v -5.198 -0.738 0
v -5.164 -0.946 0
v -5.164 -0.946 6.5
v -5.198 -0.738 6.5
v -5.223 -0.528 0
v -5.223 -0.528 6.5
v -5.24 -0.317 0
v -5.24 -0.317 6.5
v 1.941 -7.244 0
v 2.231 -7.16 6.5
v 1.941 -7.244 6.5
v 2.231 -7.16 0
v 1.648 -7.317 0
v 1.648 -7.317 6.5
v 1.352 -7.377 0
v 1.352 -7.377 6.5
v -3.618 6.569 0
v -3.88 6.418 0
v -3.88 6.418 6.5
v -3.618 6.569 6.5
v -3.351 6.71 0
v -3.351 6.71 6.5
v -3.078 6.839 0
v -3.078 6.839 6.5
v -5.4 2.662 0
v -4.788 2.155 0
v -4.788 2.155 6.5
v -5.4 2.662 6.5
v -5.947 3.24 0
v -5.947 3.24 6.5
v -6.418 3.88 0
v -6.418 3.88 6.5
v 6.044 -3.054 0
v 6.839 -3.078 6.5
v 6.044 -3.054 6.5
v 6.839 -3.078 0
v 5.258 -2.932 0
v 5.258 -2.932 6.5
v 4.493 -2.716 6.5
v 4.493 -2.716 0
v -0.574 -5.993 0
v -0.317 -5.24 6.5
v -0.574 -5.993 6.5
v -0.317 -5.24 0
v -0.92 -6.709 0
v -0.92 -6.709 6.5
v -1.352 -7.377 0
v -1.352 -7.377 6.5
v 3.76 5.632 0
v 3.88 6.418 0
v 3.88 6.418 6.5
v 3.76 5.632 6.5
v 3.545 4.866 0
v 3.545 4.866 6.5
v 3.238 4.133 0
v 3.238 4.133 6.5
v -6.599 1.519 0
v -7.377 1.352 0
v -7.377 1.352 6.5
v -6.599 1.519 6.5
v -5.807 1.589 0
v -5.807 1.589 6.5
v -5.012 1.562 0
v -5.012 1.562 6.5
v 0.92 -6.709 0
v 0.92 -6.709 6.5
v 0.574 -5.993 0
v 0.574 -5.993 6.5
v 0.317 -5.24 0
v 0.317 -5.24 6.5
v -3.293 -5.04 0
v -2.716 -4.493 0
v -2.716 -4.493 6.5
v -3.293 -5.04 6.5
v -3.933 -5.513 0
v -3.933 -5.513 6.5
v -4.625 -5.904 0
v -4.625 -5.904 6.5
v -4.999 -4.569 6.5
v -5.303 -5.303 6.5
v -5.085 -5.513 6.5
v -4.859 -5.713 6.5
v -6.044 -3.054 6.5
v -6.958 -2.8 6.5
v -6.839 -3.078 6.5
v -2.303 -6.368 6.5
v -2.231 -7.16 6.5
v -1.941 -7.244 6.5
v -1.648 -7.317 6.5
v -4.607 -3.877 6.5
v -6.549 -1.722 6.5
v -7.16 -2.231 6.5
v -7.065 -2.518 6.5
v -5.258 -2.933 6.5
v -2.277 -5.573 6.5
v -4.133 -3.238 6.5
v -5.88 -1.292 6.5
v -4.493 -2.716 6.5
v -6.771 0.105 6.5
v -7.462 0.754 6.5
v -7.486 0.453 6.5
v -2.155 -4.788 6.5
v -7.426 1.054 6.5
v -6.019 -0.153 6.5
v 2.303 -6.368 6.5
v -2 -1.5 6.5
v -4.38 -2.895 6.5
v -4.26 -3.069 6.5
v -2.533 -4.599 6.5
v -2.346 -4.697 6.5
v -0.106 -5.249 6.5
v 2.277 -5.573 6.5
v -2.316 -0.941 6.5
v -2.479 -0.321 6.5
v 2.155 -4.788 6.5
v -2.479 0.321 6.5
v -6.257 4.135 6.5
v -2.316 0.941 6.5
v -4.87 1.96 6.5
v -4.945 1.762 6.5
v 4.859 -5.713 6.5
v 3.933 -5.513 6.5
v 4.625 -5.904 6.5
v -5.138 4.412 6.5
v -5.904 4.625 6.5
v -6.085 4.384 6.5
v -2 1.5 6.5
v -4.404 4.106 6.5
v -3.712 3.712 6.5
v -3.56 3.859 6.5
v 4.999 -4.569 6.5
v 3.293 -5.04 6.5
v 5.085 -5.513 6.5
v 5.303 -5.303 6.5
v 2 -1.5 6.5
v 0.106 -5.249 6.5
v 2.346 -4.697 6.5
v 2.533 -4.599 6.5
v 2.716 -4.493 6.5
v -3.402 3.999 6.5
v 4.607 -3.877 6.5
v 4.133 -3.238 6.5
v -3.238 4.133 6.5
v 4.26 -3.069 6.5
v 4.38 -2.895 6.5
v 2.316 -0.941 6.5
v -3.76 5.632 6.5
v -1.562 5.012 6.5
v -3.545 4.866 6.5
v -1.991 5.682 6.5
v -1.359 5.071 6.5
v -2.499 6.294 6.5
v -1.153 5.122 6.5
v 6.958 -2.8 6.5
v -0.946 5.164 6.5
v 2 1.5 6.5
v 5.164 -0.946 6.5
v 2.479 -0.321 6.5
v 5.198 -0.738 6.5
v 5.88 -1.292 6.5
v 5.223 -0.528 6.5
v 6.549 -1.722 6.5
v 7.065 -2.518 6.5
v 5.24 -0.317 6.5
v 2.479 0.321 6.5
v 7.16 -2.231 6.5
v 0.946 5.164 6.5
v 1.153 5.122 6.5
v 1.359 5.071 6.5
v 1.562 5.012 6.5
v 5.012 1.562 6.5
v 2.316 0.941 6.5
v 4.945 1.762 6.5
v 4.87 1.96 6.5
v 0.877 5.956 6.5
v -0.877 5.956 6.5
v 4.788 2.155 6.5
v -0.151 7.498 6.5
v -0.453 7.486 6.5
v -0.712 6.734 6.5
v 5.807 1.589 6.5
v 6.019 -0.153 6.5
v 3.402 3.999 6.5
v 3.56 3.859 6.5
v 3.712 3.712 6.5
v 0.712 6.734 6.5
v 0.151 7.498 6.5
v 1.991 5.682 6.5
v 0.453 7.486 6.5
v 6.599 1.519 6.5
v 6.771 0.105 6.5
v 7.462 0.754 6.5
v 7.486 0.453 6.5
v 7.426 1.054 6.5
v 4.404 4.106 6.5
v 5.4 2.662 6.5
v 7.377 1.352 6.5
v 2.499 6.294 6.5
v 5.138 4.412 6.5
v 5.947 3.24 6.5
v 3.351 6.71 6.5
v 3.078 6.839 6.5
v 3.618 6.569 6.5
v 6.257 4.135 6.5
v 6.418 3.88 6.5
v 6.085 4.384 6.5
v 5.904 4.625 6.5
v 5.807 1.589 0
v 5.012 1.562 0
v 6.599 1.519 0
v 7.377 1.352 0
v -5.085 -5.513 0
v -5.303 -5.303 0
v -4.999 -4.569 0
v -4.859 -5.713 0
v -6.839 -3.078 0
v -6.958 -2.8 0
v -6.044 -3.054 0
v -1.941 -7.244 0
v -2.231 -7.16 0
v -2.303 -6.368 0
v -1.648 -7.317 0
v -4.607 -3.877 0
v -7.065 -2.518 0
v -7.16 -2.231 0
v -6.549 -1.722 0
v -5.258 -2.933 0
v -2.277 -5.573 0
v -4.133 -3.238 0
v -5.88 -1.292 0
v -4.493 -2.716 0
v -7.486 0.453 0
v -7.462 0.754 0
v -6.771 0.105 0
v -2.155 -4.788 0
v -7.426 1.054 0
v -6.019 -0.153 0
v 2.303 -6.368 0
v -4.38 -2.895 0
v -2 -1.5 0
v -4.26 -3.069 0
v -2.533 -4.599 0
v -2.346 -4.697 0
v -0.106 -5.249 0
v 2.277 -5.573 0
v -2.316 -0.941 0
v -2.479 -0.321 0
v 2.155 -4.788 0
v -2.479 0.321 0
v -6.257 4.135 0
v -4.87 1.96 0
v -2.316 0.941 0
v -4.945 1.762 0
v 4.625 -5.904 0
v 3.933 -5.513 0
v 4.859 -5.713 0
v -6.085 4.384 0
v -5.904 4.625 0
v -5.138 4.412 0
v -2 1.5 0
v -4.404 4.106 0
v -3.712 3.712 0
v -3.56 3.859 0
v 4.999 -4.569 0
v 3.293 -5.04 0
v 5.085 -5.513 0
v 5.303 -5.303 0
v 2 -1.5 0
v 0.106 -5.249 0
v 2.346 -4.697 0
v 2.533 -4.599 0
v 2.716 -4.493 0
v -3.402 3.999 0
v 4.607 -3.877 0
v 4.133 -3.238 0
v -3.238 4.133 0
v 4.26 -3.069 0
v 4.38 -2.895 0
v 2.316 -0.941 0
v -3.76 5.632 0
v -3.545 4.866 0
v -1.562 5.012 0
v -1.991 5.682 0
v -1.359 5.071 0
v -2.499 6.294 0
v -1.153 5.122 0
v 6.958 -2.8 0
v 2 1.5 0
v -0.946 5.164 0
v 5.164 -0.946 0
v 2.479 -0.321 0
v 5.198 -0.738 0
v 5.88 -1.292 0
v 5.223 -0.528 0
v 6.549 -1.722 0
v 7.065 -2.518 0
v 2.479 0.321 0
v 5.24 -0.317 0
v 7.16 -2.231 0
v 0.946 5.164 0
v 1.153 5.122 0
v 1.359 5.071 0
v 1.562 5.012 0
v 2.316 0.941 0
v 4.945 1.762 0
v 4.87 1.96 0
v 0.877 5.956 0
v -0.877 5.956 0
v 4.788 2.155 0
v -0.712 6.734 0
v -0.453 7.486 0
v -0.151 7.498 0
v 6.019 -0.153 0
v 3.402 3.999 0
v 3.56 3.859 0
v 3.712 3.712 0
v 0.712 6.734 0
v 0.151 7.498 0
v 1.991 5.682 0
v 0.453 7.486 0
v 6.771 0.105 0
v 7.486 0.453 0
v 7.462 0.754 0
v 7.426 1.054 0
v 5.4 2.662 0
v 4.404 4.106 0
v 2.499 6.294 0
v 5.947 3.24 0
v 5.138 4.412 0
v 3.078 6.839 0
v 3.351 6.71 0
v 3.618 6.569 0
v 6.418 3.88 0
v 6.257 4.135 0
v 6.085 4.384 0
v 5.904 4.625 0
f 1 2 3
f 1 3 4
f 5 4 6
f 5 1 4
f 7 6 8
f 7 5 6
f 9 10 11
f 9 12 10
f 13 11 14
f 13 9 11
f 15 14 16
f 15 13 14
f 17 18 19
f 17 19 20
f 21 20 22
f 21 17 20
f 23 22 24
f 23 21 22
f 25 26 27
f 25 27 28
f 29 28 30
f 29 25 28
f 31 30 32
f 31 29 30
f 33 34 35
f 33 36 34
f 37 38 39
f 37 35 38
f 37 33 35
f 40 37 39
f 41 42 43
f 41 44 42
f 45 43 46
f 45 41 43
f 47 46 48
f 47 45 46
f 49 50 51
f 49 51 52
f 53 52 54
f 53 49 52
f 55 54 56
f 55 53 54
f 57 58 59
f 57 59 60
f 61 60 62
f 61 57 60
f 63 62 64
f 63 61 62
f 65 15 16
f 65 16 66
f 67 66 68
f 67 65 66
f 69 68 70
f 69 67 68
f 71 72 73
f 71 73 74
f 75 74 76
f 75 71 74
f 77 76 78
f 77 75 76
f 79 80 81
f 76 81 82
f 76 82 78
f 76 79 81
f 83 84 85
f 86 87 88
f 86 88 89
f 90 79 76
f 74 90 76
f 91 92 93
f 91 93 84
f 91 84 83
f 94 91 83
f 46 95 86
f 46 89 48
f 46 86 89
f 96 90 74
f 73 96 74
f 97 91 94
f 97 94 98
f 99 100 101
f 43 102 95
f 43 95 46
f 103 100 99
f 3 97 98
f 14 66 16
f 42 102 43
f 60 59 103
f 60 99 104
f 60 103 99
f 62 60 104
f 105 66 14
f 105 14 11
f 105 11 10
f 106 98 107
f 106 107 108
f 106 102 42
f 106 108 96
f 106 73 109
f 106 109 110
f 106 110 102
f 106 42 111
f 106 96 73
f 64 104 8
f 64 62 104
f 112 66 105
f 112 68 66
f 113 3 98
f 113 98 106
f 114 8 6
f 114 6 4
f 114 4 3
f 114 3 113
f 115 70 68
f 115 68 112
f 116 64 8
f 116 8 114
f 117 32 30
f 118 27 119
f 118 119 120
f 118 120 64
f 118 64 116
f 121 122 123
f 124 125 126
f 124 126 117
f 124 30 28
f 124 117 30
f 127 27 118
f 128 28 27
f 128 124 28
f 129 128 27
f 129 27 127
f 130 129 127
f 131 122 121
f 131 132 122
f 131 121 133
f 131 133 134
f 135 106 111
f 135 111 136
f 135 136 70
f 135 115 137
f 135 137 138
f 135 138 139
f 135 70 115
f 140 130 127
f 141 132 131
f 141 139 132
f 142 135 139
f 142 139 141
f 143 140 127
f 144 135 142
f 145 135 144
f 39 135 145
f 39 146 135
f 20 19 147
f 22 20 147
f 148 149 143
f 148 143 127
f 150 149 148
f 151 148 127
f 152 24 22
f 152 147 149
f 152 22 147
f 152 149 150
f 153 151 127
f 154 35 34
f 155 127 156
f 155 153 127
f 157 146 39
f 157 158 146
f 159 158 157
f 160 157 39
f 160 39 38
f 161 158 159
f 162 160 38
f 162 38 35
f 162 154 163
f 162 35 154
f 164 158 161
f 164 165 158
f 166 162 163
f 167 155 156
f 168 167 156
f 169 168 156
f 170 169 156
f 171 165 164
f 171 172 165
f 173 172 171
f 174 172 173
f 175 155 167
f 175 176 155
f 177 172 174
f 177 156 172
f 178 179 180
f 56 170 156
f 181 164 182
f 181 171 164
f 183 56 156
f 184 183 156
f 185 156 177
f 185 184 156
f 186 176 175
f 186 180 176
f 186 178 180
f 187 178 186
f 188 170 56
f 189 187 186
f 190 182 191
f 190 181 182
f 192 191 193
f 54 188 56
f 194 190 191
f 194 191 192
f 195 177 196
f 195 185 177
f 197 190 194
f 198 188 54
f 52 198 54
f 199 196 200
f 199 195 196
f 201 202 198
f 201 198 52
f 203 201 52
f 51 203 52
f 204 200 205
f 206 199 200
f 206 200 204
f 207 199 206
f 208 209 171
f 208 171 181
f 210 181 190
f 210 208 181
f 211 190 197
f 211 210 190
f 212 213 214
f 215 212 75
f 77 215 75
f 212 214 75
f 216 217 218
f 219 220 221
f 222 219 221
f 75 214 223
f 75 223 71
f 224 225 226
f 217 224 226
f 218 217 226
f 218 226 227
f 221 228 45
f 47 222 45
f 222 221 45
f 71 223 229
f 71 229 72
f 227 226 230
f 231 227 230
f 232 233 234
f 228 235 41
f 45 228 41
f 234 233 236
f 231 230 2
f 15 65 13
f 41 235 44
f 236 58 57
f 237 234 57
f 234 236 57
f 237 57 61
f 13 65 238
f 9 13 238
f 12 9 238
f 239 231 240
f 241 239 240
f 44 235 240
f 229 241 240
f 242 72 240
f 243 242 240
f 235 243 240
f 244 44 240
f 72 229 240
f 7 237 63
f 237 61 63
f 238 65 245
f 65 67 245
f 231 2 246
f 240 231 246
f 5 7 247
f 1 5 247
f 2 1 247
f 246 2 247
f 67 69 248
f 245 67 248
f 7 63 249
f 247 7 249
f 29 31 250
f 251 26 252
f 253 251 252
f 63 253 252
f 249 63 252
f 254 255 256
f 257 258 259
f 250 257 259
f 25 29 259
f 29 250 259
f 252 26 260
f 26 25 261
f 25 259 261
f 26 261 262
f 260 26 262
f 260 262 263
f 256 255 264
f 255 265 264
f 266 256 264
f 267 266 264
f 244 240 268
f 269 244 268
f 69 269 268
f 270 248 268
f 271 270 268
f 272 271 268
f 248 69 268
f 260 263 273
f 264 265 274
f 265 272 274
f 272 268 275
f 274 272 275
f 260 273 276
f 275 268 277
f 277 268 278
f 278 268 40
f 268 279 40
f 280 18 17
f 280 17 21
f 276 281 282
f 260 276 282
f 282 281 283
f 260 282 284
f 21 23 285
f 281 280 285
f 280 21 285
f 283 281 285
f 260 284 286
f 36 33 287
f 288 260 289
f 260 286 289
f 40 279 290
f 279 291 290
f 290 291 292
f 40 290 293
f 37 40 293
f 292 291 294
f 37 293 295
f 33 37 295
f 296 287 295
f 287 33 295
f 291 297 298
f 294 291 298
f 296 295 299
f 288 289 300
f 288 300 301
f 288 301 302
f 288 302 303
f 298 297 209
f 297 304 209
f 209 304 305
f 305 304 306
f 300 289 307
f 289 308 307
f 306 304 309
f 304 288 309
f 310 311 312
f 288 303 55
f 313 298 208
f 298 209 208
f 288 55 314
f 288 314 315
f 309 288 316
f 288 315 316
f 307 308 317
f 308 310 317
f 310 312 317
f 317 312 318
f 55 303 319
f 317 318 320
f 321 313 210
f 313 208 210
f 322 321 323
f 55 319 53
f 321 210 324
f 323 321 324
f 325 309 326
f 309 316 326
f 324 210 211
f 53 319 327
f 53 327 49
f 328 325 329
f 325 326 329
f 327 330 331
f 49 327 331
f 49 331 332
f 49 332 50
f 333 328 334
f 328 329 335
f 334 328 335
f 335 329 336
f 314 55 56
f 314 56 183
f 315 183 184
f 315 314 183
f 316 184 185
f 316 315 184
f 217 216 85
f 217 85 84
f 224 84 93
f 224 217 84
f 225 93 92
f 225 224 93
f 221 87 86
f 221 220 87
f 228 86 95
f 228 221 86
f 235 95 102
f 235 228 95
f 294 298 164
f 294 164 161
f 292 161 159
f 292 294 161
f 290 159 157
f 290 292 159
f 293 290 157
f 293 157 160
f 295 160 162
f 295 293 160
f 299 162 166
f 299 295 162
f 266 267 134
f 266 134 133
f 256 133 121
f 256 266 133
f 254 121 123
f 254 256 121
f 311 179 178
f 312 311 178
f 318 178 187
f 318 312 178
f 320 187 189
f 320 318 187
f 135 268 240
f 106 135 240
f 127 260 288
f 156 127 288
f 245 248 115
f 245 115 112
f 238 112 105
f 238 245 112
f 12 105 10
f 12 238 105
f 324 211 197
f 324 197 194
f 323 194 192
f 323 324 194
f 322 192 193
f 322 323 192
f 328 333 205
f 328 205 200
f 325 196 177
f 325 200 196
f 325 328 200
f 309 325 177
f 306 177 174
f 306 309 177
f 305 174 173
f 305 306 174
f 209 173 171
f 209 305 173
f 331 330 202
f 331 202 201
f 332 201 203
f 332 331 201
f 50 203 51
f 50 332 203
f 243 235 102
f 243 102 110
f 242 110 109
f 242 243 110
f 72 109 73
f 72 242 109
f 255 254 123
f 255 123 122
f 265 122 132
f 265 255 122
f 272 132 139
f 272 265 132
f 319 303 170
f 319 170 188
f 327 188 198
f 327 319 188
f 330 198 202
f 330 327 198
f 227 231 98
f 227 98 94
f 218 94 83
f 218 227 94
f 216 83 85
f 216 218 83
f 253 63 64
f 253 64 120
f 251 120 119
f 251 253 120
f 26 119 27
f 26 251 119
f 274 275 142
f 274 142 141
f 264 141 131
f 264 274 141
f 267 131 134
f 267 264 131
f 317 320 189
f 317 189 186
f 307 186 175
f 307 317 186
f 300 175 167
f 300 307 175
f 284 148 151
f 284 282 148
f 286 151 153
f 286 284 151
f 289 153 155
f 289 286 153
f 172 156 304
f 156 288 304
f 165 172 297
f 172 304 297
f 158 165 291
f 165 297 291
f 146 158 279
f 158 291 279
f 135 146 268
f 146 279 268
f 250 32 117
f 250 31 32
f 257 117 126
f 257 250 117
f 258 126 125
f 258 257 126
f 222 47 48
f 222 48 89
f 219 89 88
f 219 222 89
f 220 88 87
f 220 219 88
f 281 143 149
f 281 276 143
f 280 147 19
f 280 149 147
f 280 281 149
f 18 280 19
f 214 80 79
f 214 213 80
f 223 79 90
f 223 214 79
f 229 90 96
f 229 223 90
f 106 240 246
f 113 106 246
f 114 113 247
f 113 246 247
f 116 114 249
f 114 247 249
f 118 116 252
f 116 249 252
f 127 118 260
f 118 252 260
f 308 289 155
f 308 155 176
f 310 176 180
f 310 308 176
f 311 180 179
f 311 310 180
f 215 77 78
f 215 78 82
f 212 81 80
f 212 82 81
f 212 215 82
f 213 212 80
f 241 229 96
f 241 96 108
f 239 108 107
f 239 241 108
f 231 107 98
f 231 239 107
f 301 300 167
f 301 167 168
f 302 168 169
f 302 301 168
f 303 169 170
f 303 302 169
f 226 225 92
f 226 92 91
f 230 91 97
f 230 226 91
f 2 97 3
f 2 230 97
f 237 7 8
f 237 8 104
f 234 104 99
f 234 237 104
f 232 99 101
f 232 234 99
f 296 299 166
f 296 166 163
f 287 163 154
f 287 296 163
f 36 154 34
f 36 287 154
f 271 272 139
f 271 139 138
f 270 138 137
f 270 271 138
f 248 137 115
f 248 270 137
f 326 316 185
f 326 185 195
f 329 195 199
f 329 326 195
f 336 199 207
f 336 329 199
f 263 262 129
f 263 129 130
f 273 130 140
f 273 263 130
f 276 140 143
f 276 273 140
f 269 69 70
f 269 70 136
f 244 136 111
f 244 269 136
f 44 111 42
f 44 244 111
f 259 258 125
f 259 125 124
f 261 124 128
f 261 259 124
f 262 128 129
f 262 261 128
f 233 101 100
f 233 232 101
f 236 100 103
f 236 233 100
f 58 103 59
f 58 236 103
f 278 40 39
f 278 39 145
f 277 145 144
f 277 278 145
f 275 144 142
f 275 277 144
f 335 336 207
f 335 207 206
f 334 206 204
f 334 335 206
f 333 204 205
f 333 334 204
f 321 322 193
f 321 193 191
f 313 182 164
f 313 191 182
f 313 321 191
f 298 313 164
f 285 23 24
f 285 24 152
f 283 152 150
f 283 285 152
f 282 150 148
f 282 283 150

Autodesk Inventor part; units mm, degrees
ref_plane "YZ Plane" through (0, 0, 0) normal (1, 0, 0) x (0, 1, 0)
ref_plane "XZ Plane" through (0, 0, 0) normal (0, 1, 0) x (-1, 0, 0)
ref_plane "XY Plane" through (0, 0, 0) normal (0, 0, 1) x (1, 0, 0)
sketch "スケッチ1" plane through (0, 0, 0) normal (0, 0, 1) x (1, 0, 0)
  arc A0 (-3.88, 6.4184) -> (-3.2378, 4.1327) centre (2.5862, 7.0023) ccw
  arc A1 (-3.2378, 4.1327) -> (-3.7123, 3.7123) centre (0, 0) ccw
  arc A2 (-3.7123, 3.7123) -> (-5.9039, 4.6254) centre (-7.263, -1.7233) ccw
  arc A3 (-5.9039, 4.6254) -> (-6.4184, 3.88) centre (0, 0) ccw
  arc A4 (-6.4184, 3.88) -> (-4.7875, 2.1547) centre (-0.9641, 7.4021) ccw
  arc A5 (-4.7875, 2.1547) -> (-5.0123, 1.5619) centre (0, 0) ccw
  arc A6 (-5.0123, 1.5619) -> (-7.3771, 1.3519) centre (-5.6302, -4.9012) ccw
  arc A7 (-7.3771, 1.3519) -> (-7.4863, 0.4528) centre (0, 0) ccw
  arc A8 (-7.4863, 0.4528) -> (-5.2404, -0.317) centre (-4.2936, 6.1062) ccw
  arc A9 (-5.2404, -0.317) -> (-5.164, -0.9463) centre (0, 0) ccw
  arc A10 (-5.164, -0.9463) -> (-7.1604, -2.2313) centre (-2.7076, -6.9563) ccw
  arc A11 (-7.1604, -2.2313) -> (-6.8392, -3.0781) centre (0, 0) ccw
  arc A12 (-6.8392, -3.0781) -> (-4.4929, -2.716) centre (-6.6395, 3.4114) ccw
  arc A13 (-4.4929, -2.716) -> (-4.1327, -3.2378) centre (0, 0) ccw
  arc A14 (-4.1327, -3.2378) -> (-5.3033, -5.3033) centre (0.8353, -7.4178) ccw
  arc A15 (-5.3033, -5.3033) -> (-4.6254, -5.9039) centre (0, 0) ccw
  arc A16 (-4.6254, -5.9039) -> (-2.716, -4.4929) centre (-7.4644, -0.0649) ccw
  arc A17 (-2.716, -4.4929) -> (-2.1547, -4.7875) centre (0, 0) ccw
  arc A18 (-2.1547, -4.7875) -> (-2.2313, -7.1604) centre (4.1868, -6.1799) ccw
  arc A19 (-2.2313, -7.1604) -> (-1.3519, -7.3771) centre (0, 0) ccw
  arc A20 (-1.3519, -7.3771) -> (-0.317, -5.2404) centre (-6.5792, -3.5263) ccw
  arc A21 (-0.317, -5.2404) -> (0.317, -5.2404) centre (0, 0) ccw
  arc A22 (0.317, -5.2404) -> (1.3519, -7.3771) centre (6.5792, -3.5263) ccw
  arc A23 (1.3519, -7.3771) -> (2.2313, -7.1604) centre (0, 0) ccw
  arc A24 (2.2313, -7.1604) -> (2.1547, -4.7875) centre (-4.1868, -6.1799) ccw
  arc A25 (2.1547, -4.7875) -> (2.716, -4.4929) centre (0, 0) ccw
  arc A26 (2.716, -4.4929) -> (4.6254, -5.9039) centre (7.4644, -0.0649) ccw
  arc A27 (4.6254, -5.9039) -> (5.3033, -5.3033) centre (0, 0) ccw
  arc A28 (5.3033, -5.3033) -> (4.1327, -3.2378) centre (-0.8353, -7.4178) ccw
  arc A29 (4.1327, -3.2378) -> (4.4929, -2.716) centre (0, 0) ccw
  arc A30 (4.4929, -2.716) -> (6.8392, -3.0781) centre (6.6395, 3.4114) ccw
  arc A31 (6.8392, -3.0781) -> (7.1604, -2.2313) centre (0, 0) ccw
  arc A32 (7.1604, -2.2313) -> (5.164, -0.9463) centre (2.7076, -6.9563) ccw
  arc A33 (5.164, -0.9463) -> (5.2404, -0.317) centre (0, 0) ccw
  arc A34 (5.2404, -0.317) -> (7.4863, 0.4528) centre (4.2936, 6.1062) ccw
  arc A35 (7.4863, 0.4528) -> (7.3771, 1.3519) centre (0, 0) ccw
  arc A36 (7.3771, 1.3519) -> (5.0123, 1.5619) centre (5.6302, -4.9012) ccw
  arc A37 (5.0123, 1.5619) -> (4.7875, 2.1547) centre (0, 0) ccw
  arc A38 (4.7875, 2.1547) -> (6.4184, 3.88) centre (0.9641, 7.4021) ccw
  arc A39 (6.4184, 3.88) -> (5.9039, 4.6254) centre (0, 0) ccw
  arc A40 (5.9039, 4.6254) -> (3.7123, 3.7123) centre (7.263, -1.7233) ccw
  arc A41 (3.7123, 3.7123) -> (3.2378, 4.1327) centre (0, 0) ccw
  arc A42 (3.2378, 4.1327) -> (3.88, 6.4184) centre (-2.5862, 7.0023) ccw
  arc A43 (3.88, 6.4184) -> (3.0781, 6.8392) centre (0, 0) ccw
  arc A44 (3.0781, 6.8392) -> (1.5619, 5.0123) centre (7.2319, 1.8493) ccw
  arc A45 (1.5619, 5.0123) -> (0.9463, 5.164) centre (0, 0) ccw
  arc A46 (0.9463, 5.164) -> (0.4528, 7.4863) centre (-5.5441, 4.9983) ccw
  arc A47 (0.4528, 7.4863) -> (-0.4528, 7.4863) centre (0, 0) ccw
  arc A48 (-0.4528, 7.4863) -> (-0.9463, 5.164) centre (5.5441, 4.9983) ccw
  arc A49 (-0.9463, 5.164) -> (-1.5619, 5.0123) centre (0, 0) ccw
  arc A50 (-1.5619, 5.0123) -> (-3.0781, 6.8392) centre (-7.2319, 1.8493) ccw
  arc A51 (-3.0781, 6.8392) -> (-3.88, 6.4184) centre (0, 0) ccw
sketch "スケッチ2" plane through (0, 0, 0) normal (0, 0, 1) x (1, 0, 0)
  line L0 (-2, 1.5) -> (2, 1.5)
  line L1 (2, -1.5) -> (-2, -1.5)
  arc A0 (-2, 1.5) -> (-2, -1.5) centre (0, 0) ccw
  arc A1 (2, -1.5) -> (2, 1.5) centre (0, 0) ccw
  point P0 (0, 0)
  point P1 (0, 0)
  point P2 (0, 0)
  point P3 (0, 0)
  point P4 (0, 0)
  point P5 (0, 0)
  point P6 (0, 0)
  point P7 (0, 0)
  point P8 (0, 0)
  point P9 (0, 0)
  point P10 (0, 0)
  point P11 (0, 0)
  point P12 (0, 0)
  point P13 (0, 0)
  point P14 (0, 0)
  point P15 (0, 0)
  point P16 (0, 0)
  point P17 (0, 0)
  point P18 (0, 0)
  point P19 (0, 0)
  point P20 (0, 0)
  point P21 (0, 0)
  point P22 (0, 0)
  point P23 (0, 0)
  point P24 (0, 0)
  point P25 (0, 0)
extrude "押し出し1" add sketch "スケッチ1" along normal blind 6.5
extrude "押し出し2" cut sketch "スケッチ2" along normal blind 6.5
properties part number "Gear13"
